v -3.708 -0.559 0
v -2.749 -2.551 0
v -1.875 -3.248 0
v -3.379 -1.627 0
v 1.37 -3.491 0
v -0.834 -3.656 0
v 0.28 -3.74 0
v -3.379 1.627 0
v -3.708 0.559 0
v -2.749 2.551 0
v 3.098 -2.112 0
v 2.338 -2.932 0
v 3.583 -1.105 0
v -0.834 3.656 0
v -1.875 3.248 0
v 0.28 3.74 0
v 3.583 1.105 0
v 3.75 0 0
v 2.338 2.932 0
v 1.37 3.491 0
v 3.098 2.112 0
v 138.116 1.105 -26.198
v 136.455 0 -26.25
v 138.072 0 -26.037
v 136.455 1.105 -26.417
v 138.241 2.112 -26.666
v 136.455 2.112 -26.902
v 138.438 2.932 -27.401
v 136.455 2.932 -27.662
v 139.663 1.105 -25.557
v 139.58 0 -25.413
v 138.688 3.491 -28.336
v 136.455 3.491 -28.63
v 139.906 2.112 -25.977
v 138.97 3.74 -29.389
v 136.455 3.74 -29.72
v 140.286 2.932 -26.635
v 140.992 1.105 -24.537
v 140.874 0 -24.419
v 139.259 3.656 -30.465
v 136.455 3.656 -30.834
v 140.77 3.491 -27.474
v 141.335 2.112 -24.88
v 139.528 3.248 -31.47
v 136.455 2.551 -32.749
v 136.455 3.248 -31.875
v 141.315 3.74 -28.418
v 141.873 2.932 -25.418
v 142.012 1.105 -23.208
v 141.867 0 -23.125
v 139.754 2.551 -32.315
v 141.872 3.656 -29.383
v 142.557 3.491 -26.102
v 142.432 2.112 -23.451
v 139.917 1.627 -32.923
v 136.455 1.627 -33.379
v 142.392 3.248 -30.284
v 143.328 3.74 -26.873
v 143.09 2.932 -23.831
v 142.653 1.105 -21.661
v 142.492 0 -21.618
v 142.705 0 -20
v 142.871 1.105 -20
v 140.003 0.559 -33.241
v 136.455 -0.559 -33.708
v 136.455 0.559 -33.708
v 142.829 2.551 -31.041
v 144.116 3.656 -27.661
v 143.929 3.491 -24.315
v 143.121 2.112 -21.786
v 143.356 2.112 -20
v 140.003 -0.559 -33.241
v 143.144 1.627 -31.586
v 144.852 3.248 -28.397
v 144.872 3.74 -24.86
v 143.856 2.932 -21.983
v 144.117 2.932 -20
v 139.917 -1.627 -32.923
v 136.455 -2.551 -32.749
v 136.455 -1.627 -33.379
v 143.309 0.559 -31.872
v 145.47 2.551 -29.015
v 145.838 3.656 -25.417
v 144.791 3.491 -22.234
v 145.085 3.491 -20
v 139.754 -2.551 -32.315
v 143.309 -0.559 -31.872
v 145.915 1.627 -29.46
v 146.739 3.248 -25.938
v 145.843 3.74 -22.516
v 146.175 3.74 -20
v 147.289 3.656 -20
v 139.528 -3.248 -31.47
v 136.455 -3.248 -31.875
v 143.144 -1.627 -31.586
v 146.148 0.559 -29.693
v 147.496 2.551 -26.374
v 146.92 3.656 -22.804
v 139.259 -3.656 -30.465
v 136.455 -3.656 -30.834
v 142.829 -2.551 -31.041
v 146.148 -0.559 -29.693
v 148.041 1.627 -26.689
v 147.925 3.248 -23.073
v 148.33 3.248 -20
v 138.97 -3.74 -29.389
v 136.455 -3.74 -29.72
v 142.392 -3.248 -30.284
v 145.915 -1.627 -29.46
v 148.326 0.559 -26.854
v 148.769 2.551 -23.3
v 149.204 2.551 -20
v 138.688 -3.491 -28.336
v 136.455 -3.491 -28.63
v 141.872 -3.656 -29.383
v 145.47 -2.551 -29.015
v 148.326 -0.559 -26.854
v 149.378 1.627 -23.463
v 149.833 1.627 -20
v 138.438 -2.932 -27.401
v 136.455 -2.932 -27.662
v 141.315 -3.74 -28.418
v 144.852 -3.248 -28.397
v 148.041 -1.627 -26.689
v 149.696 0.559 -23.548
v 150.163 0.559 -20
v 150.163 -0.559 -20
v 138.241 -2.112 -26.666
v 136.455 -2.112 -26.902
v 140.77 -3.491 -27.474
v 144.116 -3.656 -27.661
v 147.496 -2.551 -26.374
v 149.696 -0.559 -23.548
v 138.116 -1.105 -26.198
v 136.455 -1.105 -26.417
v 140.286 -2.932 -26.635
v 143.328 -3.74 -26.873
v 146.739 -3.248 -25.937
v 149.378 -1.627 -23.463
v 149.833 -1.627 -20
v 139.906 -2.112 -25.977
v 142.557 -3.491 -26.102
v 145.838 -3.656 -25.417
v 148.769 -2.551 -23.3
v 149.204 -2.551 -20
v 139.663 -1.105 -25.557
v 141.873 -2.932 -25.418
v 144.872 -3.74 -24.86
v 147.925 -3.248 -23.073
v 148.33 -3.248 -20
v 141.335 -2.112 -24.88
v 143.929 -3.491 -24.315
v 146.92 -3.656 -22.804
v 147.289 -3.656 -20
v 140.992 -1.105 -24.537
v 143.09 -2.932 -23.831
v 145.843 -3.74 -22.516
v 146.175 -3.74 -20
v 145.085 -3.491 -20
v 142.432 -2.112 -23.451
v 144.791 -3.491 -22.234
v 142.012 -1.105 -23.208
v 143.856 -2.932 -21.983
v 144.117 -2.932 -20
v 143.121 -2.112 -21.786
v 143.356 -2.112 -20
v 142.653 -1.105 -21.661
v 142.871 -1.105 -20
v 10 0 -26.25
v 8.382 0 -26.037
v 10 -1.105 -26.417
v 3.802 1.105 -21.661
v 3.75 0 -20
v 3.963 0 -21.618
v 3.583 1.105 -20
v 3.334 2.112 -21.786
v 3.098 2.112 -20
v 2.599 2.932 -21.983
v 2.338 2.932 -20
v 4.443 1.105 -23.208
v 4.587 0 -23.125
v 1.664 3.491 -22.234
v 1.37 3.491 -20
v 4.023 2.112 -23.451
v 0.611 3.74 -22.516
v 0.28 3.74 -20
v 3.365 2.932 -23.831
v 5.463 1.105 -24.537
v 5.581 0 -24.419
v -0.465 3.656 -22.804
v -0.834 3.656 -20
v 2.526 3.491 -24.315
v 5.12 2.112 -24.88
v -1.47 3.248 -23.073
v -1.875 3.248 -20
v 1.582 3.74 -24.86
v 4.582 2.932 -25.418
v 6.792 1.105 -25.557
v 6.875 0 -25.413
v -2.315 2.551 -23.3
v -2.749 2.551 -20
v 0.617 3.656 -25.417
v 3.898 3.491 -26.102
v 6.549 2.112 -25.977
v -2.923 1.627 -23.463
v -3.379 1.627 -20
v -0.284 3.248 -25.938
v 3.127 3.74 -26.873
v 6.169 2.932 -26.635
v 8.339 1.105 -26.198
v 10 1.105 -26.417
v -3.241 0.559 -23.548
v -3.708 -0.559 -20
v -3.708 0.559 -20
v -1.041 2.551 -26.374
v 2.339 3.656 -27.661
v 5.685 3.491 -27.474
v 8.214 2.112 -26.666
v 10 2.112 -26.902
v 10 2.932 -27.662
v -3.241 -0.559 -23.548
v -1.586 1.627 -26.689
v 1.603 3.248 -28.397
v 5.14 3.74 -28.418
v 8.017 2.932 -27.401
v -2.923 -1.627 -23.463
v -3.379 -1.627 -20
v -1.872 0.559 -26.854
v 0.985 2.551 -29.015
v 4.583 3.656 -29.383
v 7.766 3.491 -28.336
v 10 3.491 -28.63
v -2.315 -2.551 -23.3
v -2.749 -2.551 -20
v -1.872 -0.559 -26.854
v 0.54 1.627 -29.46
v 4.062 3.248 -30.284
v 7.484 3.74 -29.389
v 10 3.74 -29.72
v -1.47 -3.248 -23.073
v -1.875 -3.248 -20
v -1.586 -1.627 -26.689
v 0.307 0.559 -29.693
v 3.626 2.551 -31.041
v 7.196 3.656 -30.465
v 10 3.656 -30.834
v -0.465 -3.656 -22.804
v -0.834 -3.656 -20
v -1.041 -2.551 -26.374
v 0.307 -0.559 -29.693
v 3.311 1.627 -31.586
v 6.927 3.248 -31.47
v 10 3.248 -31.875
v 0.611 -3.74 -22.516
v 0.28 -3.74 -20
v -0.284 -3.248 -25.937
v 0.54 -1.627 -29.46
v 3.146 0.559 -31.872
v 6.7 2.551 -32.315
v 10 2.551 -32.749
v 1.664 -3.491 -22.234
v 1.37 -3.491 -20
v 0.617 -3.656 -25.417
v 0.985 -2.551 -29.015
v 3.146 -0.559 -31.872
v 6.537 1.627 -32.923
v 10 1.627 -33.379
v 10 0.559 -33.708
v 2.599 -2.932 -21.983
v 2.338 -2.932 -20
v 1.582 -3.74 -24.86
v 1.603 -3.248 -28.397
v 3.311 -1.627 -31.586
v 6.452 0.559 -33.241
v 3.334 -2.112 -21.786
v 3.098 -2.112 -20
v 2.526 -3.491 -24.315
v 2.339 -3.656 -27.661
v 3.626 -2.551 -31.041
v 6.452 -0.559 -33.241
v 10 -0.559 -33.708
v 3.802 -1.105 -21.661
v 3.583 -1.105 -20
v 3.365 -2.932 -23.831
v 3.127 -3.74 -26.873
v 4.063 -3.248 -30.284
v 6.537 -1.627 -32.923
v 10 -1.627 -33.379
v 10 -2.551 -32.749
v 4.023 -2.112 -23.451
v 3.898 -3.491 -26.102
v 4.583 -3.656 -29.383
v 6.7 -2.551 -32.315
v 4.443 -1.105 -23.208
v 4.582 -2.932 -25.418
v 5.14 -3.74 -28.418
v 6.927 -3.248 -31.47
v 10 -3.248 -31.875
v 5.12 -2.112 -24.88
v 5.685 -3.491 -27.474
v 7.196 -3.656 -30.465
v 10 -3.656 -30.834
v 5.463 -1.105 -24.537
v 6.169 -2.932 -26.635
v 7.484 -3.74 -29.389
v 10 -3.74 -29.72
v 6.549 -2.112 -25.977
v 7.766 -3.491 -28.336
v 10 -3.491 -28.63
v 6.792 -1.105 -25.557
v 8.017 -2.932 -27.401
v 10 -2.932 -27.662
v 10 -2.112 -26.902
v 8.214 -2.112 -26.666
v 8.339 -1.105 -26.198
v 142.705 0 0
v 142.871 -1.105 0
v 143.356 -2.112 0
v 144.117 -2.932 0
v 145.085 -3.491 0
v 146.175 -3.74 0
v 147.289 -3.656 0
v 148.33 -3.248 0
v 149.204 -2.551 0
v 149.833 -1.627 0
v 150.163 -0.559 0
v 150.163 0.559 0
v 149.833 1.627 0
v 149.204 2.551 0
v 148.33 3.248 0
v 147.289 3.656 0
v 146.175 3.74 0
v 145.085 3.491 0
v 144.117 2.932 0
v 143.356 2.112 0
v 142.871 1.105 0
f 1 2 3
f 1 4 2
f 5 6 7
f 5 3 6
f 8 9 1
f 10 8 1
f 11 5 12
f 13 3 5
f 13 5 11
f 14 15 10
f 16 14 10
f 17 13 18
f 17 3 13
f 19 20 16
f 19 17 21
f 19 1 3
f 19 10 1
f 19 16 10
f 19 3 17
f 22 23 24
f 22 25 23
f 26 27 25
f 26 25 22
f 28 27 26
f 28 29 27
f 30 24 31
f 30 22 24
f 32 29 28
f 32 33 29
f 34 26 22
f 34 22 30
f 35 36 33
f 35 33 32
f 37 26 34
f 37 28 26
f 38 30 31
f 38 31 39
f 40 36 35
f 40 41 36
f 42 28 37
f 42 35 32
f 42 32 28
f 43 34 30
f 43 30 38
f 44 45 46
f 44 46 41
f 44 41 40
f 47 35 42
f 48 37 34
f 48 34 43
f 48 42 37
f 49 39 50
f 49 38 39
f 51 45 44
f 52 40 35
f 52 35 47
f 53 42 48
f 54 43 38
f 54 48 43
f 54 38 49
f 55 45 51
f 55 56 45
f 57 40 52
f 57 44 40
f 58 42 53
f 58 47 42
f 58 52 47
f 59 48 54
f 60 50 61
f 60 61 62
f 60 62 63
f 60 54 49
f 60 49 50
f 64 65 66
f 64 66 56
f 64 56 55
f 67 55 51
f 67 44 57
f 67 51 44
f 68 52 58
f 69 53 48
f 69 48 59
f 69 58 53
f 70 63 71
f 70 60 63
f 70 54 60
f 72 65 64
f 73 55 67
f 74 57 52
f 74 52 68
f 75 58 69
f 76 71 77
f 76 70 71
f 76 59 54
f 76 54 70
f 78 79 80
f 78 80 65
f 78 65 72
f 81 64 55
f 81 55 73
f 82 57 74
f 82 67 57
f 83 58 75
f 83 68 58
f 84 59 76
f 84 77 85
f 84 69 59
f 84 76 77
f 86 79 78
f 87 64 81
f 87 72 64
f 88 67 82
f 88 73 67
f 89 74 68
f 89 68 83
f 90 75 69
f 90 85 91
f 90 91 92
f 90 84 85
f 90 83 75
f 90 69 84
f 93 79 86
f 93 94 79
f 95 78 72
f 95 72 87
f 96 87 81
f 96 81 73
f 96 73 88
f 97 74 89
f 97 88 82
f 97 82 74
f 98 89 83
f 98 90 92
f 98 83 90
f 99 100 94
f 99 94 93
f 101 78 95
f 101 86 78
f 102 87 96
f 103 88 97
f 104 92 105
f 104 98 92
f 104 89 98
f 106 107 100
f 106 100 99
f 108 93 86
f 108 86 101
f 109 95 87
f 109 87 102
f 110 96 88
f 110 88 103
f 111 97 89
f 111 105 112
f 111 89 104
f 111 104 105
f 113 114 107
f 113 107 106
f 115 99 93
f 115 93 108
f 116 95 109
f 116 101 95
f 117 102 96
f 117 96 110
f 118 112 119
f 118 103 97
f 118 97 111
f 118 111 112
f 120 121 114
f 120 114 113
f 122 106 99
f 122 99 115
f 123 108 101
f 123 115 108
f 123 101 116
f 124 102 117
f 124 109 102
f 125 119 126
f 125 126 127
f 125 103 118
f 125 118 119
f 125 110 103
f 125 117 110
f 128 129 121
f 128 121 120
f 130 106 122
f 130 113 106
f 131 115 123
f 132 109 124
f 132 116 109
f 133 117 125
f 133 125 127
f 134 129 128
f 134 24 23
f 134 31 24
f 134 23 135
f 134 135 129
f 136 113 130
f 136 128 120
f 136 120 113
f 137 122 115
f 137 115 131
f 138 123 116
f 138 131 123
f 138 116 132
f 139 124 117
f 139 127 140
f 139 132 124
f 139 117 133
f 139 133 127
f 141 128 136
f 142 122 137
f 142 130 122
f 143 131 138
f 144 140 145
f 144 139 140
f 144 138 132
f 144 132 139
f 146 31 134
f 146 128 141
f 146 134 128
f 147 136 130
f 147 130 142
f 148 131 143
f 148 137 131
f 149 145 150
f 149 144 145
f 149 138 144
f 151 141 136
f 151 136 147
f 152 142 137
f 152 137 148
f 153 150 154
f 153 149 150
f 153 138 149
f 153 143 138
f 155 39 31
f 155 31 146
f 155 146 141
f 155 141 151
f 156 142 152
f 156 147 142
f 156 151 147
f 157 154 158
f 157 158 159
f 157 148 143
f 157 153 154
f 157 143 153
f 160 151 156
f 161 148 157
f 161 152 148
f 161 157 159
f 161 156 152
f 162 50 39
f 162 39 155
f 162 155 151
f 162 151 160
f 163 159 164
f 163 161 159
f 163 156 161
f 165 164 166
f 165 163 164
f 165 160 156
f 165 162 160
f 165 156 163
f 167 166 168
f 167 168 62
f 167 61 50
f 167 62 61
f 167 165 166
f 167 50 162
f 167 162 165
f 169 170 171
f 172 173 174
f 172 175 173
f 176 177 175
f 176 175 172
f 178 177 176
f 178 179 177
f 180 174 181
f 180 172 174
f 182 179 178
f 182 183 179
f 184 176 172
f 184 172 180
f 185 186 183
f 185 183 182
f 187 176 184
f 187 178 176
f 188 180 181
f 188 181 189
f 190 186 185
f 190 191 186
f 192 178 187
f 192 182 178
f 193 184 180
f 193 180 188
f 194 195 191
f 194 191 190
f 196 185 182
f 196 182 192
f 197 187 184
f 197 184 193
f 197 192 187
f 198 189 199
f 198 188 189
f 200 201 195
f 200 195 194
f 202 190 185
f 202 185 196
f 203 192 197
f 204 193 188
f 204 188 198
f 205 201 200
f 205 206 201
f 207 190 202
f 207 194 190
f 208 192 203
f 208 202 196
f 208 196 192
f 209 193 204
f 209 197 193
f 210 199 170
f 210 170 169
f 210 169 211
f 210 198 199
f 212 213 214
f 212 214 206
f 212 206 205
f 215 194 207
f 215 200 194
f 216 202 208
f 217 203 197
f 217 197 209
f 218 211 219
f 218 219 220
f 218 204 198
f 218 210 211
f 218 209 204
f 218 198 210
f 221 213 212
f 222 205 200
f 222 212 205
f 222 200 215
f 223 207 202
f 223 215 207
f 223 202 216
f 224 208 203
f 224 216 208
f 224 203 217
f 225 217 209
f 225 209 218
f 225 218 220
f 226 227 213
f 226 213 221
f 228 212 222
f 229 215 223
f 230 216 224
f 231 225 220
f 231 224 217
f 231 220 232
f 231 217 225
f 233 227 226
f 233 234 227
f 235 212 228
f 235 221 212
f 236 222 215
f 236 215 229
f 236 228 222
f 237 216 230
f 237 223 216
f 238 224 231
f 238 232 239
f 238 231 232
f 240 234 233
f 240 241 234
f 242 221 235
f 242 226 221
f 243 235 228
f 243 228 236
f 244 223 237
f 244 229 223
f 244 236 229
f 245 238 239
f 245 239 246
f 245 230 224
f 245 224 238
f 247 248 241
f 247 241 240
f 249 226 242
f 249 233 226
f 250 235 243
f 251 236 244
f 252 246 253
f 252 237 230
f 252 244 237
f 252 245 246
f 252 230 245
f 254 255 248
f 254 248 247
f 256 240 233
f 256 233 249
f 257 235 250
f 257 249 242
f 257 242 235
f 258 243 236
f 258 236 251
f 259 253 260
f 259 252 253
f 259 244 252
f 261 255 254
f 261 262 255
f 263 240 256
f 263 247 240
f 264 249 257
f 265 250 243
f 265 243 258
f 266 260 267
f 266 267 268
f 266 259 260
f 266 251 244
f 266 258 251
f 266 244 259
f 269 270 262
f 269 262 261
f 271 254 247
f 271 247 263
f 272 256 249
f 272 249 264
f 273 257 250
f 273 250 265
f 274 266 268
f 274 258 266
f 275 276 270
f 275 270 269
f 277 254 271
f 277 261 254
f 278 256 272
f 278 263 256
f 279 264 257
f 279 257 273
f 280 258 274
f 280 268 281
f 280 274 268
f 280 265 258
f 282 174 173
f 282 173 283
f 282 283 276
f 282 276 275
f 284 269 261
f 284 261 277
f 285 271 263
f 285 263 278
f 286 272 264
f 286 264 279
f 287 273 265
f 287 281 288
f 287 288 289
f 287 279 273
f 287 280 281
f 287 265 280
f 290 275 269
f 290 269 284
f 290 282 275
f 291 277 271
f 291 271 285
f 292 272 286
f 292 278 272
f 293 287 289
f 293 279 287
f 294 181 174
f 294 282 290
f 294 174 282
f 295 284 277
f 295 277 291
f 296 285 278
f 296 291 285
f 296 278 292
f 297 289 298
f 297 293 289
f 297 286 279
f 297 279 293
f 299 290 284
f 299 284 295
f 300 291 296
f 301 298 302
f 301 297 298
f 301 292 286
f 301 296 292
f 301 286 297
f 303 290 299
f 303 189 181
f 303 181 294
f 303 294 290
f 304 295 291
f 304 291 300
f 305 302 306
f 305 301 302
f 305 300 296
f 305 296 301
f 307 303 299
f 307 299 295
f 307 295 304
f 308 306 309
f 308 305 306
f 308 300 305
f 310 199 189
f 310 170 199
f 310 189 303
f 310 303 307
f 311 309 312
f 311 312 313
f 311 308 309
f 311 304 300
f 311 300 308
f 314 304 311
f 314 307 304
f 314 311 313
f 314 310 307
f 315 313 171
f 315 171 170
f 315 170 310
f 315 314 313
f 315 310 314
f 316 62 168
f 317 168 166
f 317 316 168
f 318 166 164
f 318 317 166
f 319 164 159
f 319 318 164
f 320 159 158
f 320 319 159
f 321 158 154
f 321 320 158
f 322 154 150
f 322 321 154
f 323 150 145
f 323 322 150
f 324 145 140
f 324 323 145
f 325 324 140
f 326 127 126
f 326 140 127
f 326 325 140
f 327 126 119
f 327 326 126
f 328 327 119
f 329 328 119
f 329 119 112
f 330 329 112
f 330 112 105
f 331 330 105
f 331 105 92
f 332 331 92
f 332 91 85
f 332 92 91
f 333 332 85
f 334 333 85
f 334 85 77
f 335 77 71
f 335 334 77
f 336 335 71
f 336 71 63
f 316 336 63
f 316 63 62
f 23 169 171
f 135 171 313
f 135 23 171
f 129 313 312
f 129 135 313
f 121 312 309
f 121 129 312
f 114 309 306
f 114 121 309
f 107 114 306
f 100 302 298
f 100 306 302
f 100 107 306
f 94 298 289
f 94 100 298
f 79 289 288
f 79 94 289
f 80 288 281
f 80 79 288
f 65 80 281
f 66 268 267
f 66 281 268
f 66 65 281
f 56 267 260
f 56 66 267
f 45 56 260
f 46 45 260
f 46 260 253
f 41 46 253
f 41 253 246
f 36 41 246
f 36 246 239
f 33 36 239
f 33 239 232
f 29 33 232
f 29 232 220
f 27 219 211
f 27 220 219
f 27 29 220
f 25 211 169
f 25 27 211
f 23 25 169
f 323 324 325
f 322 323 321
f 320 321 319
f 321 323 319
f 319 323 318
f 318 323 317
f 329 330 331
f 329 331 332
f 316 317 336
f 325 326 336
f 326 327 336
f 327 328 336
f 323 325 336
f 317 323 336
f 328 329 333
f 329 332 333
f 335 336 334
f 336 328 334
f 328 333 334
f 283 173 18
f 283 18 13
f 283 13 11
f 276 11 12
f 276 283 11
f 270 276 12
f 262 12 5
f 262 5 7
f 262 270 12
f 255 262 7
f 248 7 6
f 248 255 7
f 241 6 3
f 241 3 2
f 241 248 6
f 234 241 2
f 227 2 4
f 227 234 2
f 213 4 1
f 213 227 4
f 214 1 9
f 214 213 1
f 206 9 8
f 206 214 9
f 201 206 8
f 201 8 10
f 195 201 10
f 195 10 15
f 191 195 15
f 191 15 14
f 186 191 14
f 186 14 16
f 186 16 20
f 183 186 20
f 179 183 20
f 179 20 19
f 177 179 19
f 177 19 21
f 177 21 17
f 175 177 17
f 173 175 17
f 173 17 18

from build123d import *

# Parameters (mm, degrees)
CROQUIS2_R = 3.75


with BuildPart() as part:
    # Barrer1: sweep along a path in Croquis1
    with BuildLine(Plane(origin=(0, 0, 0), x_dir=(1, 0, 0), z_dir=(0, 1, 0))) as barrer1_path:
        Line((0, 0), (0, 20))
        ThreePointArc((0, 20), (2.928932188, 27.071067812), (10, 30))
        Line((10, 30), (136.4548, 30))
        ThreePointArc((136.4548, 30), (143.525867812, 27.071067812), (146.4548, 20))
        Line((146.4548, 20), (146.4548, 0))
    # Croquis2 → Barrer1 (sweep)
    with BuildSketch(Plane.XY):
        Circle(CROQUIS2_R)
    sweep(path=barrer1_path.line)


solid = part.part
